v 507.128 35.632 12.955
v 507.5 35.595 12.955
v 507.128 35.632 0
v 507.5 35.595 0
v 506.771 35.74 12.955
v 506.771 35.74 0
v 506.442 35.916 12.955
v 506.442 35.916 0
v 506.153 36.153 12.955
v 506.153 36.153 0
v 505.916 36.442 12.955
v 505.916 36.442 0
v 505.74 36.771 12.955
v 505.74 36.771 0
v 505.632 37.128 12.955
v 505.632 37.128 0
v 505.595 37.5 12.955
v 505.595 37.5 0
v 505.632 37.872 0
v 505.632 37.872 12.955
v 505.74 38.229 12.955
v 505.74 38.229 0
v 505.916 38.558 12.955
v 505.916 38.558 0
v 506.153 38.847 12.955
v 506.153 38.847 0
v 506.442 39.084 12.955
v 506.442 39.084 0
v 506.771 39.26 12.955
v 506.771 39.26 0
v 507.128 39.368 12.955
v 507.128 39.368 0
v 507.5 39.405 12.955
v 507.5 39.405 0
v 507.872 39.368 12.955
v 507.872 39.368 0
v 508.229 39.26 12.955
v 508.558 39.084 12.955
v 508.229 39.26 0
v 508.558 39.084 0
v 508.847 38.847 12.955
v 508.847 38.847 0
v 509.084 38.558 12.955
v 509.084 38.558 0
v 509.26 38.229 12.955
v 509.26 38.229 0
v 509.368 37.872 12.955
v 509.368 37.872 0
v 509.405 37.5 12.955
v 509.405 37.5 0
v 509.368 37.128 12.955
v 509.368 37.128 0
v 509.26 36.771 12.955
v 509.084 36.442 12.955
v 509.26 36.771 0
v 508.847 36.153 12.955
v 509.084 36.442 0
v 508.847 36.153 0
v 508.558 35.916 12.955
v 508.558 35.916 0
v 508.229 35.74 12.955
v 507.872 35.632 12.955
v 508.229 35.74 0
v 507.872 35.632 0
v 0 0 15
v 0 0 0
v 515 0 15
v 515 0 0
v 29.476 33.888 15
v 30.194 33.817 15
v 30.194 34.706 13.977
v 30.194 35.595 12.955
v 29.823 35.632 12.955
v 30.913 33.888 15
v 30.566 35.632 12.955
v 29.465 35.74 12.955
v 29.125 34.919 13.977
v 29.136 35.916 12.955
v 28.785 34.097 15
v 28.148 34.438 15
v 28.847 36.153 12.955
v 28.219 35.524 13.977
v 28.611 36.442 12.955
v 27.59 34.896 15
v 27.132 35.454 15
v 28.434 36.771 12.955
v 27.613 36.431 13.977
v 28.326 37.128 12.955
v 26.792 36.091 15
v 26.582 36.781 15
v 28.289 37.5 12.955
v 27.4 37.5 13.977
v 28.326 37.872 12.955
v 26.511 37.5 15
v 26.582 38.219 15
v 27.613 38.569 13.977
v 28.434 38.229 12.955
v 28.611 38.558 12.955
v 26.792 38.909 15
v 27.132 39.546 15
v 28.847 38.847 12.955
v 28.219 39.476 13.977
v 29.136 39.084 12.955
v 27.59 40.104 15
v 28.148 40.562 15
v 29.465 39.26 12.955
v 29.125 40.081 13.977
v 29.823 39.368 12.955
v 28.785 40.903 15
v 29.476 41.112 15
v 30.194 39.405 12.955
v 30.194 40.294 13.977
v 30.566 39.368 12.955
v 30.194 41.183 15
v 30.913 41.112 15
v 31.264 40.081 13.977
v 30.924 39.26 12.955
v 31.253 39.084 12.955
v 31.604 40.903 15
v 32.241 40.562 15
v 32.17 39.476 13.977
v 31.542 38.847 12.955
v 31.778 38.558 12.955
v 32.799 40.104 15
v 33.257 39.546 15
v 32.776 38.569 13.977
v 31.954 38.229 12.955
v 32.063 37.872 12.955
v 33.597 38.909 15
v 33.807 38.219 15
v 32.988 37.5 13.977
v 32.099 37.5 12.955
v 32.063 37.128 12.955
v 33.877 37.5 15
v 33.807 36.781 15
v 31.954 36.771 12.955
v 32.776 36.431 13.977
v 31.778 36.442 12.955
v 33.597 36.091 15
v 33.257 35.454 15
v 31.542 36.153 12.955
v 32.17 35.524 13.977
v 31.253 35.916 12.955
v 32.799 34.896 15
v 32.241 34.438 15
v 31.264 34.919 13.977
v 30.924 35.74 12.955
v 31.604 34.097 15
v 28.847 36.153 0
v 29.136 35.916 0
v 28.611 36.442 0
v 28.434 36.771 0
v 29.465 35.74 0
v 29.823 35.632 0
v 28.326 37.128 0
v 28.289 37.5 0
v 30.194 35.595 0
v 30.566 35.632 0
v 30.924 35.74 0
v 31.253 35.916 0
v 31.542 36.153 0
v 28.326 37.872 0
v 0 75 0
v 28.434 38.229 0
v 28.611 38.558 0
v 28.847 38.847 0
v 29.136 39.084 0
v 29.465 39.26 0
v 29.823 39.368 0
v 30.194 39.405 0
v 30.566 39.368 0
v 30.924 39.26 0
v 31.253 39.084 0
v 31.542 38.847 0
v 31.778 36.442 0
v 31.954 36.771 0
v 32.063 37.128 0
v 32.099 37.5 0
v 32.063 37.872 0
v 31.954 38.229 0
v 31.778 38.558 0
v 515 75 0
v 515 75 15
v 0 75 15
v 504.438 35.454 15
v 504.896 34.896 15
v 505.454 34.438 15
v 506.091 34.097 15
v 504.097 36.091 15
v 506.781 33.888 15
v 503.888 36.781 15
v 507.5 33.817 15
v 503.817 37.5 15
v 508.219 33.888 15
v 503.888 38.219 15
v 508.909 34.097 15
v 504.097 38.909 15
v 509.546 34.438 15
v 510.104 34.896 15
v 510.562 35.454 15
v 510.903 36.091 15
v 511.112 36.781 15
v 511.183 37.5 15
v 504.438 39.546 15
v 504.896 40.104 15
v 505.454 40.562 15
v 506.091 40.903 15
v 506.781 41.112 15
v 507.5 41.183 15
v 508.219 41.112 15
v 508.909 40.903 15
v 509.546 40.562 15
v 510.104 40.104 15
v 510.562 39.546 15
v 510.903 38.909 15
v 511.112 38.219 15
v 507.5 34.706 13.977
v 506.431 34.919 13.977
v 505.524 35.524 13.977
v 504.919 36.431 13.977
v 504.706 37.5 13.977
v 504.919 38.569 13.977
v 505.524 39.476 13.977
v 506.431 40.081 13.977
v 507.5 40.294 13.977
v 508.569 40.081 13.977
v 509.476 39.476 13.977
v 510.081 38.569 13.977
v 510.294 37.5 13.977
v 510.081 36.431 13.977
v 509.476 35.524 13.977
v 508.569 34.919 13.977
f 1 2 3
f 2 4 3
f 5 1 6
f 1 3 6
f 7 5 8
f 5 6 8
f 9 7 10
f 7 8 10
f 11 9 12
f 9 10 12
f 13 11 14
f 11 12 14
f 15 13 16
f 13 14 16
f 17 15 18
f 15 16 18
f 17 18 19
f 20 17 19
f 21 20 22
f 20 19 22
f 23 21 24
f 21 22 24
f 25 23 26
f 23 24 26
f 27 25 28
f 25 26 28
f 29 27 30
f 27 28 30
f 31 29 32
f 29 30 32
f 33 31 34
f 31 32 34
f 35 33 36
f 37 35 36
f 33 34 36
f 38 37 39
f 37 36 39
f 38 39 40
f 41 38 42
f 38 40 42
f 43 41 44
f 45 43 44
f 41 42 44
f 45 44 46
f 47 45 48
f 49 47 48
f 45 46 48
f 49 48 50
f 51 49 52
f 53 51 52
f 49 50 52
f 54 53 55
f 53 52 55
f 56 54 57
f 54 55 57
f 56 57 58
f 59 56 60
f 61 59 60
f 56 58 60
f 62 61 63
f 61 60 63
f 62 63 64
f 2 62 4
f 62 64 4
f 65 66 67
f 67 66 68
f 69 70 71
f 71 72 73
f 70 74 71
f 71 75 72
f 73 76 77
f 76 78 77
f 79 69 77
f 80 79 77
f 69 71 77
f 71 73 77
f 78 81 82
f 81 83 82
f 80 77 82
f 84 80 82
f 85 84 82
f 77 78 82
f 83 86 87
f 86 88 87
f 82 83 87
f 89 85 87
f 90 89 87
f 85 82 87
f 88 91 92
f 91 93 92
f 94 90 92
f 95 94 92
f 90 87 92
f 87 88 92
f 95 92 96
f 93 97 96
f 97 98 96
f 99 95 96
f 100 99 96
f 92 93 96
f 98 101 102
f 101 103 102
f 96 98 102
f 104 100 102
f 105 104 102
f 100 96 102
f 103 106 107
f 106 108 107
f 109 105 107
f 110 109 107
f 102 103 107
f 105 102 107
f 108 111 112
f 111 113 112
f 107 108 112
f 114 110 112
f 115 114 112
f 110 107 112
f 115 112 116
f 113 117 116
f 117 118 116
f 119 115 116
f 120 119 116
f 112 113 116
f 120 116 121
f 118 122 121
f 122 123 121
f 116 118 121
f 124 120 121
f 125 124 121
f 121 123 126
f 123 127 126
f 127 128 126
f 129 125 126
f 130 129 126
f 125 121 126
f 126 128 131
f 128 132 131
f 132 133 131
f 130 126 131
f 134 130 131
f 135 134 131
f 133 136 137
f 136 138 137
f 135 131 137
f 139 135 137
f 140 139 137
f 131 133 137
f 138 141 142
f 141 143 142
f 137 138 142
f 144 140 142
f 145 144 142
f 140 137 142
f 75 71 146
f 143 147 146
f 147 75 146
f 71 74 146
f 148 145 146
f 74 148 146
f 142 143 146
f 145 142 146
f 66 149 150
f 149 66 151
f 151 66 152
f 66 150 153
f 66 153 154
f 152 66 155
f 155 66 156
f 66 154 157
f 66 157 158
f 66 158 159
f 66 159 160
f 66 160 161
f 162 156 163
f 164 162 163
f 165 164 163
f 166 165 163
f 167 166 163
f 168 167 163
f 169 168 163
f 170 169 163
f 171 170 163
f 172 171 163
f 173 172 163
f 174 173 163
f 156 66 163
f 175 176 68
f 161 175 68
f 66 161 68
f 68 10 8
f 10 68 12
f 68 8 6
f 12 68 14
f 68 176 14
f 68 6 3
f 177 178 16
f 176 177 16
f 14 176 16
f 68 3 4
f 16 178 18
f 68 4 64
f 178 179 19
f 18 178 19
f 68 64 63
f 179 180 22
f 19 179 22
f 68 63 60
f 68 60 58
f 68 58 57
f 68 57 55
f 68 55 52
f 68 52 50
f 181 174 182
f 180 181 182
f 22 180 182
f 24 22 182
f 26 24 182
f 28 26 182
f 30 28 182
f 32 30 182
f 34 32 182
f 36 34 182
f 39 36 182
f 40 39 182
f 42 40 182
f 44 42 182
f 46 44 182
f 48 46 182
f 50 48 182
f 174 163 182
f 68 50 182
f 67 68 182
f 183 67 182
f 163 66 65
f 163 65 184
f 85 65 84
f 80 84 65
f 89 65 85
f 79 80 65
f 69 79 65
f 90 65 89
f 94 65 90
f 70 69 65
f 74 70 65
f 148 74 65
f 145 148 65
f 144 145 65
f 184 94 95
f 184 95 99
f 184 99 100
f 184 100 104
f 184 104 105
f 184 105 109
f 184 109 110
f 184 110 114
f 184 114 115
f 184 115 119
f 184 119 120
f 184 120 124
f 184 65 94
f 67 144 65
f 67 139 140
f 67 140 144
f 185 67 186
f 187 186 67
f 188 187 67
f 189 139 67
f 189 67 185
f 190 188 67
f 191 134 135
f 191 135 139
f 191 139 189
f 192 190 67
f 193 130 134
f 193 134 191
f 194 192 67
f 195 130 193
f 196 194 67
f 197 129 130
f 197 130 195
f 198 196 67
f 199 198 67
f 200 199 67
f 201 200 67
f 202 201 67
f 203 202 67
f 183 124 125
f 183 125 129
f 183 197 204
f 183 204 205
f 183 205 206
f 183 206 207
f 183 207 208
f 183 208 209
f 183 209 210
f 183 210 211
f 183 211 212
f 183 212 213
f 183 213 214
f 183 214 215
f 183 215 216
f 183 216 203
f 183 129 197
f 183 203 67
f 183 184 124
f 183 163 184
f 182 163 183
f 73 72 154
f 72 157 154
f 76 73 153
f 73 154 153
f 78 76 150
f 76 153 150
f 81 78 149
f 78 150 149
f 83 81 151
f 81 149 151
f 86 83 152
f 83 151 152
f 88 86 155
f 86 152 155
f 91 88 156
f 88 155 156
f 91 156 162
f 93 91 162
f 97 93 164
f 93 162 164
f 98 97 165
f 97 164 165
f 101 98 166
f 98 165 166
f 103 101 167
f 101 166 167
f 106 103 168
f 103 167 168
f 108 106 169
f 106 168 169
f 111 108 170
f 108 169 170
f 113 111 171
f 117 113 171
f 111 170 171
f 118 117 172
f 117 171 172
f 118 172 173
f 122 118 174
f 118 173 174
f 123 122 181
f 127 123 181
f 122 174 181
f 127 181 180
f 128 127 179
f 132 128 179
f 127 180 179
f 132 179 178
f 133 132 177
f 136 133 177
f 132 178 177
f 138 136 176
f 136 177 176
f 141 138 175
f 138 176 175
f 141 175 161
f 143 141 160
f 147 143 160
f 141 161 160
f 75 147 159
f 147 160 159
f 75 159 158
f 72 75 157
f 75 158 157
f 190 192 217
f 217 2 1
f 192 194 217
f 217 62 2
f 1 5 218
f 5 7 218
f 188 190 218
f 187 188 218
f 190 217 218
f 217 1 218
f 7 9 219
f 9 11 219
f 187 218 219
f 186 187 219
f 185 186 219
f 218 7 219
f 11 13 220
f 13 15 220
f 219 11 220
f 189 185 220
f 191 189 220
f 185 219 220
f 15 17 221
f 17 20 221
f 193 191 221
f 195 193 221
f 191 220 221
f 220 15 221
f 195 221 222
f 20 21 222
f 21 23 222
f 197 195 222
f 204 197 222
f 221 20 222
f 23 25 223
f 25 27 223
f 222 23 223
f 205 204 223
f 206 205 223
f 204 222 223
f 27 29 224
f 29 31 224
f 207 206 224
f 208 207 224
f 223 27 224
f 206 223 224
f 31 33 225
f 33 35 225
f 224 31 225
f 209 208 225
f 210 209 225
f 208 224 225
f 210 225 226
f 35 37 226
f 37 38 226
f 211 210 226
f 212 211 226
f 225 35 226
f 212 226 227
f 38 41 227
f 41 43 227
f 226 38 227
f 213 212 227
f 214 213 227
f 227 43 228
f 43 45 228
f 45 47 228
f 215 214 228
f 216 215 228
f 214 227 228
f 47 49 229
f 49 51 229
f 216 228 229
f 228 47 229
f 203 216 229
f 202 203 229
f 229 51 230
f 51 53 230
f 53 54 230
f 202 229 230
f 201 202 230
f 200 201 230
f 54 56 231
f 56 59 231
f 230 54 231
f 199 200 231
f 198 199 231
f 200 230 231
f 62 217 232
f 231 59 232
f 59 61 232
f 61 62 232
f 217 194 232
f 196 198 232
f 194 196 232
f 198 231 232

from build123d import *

# Parameters (mm, degrees)
SKETCH1_W                                         = 51.5
SKETCH1_H                                         = 7.5
BOSS_EXTRUDE1_DEPTH                               = 1.5
SCALE1_SCALE                                      = 10
CSK_FOR_6_FLAT_HEAD_SOCKET_CAP_SCREW4_D           = 3.81
CSK_FOR_6_FLAT_HEAD_SOCKET_CAP_SCREW4_CSINK_D     = 7.366
CSK_FOR_6_FLAT_HEAD_SOCKET_CAP_SCREW4_CSINK_ANGLE = 82
CSK_FOR_6_FLAT_HEAD_SOCKET_CAP_SCREW5_D           = 3.81
CSK_FOR_6_FLAT_HEAD_SOCKET_CAP_SCREW5_CSINK_D     = 7.366
CSK_FOR_6_FLAT_HEAD_SOCKET_CAP_SCREW5_CSINK_ANGLE = 82


with BuildPart() as part:
    # Sketch1 → Boss-Extrude1 (new body)
    with BuildSketch(Plane.XY):
        with Locations((25.75, 3.75)):
            Rectangle(SKETCH1_W, SKETCH1_H)
    extrude(amount=BOSS_EXTRUDE1_DEPTH)


with BuildPart() as part_1:
    # Scale1: scaled about (0, 0, 0)
    add(part.part.scale(SCALE1_SCALE))

    # CSK for #6 Flat Head Socket Cap Screw4 (through all)
    with Locations(Plane(origin=(-500, -171.918477494, 15), x_dir=(0, 1, 0), z_dir=(0, 0, 1))):
        with Locations((209.418477494, -1007.5)):
            CounterSinkHole(CSK_FOR_6_FLAT_HEAD_SOCKET_CAP_SCREW4_D / 2, CSK_FOR_6_FLAT_HEAD_SOCKET_CAP_SCREW4_CSINK_D / 2, counter_sink_angle=CSK_FOR_6_FLAT_HEAD_SOCKET_CAP_SCREW4_CSINK_ANGLE)

    # CSK for #6 Flat Head Socket Cap Screw5 (through all)
    with Locations(Plane(origin=(-500, -171.918477494, 15), x_dir=(0, 1, 0), z_dir=(0, 0, 1))):
        with Locations((209.418477494, -530.194488108)):
            CounterSinkHole(CSK_FOR_6_FLAT_HEAD_SOCKET_CAP_SCREW5_D / 2, CSK_FOR_6_FLAT_HEAD_SOCKET_CAP_SCREW5_CSINK_D / 2, counter_sink_angle=CSK_FOR_6_FLAT_HEAD_SOCKET_CAP_SCREW5_CSINK_ANGLE)


solid = part_1.part
